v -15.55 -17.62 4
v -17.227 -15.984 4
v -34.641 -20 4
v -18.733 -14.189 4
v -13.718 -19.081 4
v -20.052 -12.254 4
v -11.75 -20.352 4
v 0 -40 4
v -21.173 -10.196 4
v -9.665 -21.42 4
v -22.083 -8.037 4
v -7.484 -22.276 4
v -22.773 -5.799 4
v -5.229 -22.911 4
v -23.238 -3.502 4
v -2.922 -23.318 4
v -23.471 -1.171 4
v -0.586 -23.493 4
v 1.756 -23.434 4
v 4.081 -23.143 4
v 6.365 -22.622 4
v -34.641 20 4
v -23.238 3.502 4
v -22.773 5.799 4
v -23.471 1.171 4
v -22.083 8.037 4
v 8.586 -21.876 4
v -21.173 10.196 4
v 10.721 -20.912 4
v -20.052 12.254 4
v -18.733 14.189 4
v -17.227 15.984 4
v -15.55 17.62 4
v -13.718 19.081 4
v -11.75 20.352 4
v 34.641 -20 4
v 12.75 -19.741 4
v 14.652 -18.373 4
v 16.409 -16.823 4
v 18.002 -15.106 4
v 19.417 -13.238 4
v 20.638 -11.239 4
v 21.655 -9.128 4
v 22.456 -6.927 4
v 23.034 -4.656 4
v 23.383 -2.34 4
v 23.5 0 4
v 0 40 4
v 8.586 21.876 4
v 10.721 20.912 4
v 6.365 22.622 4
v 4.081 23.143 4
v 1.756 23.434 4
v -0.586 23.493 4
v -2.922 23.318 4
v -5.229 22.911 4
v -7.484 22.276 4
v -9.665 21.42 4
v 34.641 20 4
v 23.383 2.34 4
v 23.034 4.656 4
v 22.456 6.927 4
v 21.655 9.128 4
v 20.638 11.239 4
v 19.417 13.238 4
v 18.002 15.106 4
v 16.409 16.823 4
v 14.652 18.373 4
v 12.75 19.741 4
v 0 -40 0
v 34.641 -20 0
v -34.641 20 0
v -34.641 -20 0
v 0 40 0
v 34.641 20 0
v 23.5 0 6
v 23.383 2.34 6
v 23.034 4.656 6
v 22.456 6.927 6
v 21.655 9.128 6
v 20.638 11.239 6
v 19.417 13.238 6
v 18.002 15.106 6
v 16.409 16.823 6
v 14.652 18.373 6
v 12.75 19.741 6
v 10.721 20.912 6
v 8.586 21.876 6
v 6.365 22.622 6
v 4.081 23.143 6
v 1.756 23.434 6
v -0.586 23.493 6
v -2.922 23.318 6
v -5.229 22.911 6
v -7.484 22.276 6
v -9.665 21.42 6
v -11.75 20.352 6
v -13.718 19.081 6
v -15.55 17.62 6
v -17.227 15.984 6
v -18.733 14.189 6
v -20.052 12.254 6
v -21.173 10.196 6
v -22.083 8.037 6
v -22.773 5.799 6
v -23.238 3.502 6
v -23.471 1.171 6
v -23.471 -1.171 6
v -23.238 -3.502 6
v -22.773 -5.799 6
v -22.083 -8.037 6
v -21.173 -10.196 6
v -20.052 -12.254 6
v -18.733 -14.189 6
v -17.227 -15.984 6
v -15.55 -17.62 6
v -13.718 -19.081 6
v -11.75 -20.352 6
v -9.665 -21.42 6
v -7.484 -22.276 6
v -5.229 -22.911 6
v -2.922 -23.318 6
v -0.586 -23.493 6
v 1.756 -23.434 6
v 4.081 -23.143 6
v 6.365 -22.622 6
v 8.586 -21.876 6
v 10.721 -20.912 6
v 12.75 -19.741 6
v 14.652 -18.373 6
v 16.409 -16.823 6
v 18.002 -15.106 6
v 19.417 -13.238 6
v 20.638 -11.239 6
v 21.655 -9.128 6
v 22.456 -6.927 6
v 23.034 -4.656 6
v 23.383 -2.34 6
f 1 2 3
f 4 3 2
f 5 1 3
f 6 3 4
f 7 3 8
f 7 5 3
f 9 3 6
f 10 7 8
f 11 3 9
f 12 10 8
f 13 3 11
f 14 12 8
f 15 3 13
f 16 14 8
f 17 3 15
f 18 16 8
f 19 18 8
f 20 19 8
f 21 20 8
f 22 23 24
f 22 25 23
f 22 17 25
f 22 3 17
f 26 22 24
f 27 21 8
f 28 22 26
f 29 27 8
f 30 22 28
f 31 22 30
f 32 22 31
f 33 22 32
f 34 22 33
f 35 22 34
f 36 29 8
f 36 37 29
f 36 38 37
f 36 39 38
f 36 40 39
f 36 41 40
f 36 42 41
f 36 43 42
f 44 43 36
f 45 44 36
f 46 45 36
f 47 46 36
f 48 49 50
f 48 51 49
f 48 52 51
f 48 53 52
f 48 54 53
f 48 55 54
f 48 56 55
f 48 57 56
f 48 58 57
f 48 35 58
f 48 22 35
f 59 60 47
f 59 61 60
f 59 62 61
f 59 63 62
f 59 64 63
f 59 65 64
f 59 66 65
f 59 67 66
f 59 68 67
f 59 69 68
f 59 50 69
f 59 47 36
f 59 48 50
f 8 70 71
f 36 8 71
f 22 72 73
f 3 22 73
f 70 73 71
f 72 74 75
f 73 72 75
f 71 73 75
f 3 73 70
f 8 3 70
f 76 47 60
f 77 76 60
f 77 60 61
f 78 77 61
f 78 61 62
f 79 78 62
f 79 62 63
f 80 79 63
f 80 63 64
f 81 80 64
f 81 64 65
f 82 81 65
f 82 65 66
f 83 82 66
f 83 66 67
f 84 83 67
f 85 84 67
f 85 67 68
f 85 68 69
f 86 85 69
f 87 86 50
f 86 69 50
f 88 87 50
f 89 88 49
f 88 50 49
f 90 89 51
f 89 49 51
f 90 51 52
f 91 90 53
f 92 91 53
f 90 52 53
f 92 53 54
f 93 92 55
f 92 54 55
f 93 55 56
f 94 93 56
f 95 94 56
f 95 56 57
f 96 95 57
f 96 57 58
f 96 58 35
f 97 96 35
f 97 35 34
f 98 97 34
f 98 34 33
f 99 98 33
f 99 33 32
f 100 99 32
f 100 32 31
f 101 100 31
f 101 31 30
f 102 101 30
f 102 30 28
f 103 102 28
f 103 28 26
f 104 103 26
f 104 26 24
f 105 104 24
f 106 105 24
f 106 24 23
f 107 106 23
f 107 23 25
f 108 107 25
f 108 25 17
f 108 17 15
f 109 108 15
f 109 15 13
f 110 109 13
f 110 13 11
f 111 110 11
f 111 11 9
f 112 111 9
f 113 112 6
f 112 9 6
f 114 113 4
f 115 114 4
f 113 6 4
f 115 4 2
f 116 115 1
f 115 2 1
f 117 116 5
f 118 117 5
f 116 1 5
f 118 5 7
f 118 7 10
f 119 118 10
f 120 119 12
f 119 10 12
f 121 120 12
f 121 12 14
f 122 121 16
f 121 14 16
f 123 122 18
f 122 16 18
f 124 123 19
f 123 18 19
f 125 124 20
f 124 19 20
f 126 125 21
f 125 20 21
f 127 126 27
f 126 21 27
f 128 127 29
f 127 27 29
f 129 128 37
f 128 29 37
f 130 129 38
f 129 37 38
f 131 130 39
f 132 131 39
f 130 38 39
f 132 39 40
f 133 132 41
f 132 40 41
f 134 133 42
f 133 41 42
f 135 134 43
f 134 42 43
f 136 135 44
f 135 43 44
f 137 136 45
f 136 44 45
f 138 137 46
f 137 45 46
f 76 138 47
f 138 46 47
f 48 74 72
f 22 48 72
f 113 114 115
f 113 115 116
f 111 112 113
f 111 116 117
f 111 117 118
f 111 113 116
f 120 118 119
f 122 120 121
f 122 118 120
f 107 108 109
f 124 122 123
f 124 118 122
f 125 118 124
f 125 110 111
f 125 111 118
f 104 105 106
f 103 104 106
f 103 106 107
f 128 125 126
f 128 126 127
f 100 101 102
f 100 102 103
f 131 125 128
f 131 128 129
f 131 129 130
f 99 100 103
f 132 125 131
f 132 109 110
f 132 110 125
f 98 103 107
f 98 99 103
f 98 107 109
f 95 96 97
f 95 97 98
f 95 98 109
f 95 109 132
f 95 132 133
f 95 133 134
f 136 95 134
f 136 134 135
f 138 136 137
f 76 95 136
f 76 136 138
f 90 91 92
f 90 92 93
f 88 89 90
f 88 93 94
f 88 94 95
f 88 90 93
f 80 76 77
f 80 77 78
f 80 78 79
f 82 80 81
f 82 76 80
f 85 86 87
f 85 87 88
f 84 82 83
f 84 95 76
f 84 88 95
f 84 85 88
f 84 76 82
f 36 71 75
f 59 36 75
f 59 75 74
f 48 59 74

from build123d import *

# Parameters (mm, degrees)
SKETCH1_R           = 23.5
BOSS_EXTRUDE1_DEPTH = 4
SKETCH2_R           = 23.5
BOSS_EXTRUDE2_DEPTH = 6


with BuildPart() as part:
    # Sketch1 → Boss-Extrude1 (new body)
    with BuildSketch(Plane.XY):
        Polygon((34.641016151, 20), (0, 40), (-34.641016151, 20), (-34.641016151, -20), (0, -40), (34.641016151, -20), align=None)
        Circle(SKETCH1_R, mode=Mode.SUBTRACT)
    extrude(amount=BOSS_EXTRUDE1_DEPTH)

    # Sketch2 → Boss-Extrude2 (add)
    with BuildSketch(Plane.XY):
        Circle(SKETCH2_R)
    extrude(amount=BOSS_EXTRUDE2_DEPTH)


solid = part.part
